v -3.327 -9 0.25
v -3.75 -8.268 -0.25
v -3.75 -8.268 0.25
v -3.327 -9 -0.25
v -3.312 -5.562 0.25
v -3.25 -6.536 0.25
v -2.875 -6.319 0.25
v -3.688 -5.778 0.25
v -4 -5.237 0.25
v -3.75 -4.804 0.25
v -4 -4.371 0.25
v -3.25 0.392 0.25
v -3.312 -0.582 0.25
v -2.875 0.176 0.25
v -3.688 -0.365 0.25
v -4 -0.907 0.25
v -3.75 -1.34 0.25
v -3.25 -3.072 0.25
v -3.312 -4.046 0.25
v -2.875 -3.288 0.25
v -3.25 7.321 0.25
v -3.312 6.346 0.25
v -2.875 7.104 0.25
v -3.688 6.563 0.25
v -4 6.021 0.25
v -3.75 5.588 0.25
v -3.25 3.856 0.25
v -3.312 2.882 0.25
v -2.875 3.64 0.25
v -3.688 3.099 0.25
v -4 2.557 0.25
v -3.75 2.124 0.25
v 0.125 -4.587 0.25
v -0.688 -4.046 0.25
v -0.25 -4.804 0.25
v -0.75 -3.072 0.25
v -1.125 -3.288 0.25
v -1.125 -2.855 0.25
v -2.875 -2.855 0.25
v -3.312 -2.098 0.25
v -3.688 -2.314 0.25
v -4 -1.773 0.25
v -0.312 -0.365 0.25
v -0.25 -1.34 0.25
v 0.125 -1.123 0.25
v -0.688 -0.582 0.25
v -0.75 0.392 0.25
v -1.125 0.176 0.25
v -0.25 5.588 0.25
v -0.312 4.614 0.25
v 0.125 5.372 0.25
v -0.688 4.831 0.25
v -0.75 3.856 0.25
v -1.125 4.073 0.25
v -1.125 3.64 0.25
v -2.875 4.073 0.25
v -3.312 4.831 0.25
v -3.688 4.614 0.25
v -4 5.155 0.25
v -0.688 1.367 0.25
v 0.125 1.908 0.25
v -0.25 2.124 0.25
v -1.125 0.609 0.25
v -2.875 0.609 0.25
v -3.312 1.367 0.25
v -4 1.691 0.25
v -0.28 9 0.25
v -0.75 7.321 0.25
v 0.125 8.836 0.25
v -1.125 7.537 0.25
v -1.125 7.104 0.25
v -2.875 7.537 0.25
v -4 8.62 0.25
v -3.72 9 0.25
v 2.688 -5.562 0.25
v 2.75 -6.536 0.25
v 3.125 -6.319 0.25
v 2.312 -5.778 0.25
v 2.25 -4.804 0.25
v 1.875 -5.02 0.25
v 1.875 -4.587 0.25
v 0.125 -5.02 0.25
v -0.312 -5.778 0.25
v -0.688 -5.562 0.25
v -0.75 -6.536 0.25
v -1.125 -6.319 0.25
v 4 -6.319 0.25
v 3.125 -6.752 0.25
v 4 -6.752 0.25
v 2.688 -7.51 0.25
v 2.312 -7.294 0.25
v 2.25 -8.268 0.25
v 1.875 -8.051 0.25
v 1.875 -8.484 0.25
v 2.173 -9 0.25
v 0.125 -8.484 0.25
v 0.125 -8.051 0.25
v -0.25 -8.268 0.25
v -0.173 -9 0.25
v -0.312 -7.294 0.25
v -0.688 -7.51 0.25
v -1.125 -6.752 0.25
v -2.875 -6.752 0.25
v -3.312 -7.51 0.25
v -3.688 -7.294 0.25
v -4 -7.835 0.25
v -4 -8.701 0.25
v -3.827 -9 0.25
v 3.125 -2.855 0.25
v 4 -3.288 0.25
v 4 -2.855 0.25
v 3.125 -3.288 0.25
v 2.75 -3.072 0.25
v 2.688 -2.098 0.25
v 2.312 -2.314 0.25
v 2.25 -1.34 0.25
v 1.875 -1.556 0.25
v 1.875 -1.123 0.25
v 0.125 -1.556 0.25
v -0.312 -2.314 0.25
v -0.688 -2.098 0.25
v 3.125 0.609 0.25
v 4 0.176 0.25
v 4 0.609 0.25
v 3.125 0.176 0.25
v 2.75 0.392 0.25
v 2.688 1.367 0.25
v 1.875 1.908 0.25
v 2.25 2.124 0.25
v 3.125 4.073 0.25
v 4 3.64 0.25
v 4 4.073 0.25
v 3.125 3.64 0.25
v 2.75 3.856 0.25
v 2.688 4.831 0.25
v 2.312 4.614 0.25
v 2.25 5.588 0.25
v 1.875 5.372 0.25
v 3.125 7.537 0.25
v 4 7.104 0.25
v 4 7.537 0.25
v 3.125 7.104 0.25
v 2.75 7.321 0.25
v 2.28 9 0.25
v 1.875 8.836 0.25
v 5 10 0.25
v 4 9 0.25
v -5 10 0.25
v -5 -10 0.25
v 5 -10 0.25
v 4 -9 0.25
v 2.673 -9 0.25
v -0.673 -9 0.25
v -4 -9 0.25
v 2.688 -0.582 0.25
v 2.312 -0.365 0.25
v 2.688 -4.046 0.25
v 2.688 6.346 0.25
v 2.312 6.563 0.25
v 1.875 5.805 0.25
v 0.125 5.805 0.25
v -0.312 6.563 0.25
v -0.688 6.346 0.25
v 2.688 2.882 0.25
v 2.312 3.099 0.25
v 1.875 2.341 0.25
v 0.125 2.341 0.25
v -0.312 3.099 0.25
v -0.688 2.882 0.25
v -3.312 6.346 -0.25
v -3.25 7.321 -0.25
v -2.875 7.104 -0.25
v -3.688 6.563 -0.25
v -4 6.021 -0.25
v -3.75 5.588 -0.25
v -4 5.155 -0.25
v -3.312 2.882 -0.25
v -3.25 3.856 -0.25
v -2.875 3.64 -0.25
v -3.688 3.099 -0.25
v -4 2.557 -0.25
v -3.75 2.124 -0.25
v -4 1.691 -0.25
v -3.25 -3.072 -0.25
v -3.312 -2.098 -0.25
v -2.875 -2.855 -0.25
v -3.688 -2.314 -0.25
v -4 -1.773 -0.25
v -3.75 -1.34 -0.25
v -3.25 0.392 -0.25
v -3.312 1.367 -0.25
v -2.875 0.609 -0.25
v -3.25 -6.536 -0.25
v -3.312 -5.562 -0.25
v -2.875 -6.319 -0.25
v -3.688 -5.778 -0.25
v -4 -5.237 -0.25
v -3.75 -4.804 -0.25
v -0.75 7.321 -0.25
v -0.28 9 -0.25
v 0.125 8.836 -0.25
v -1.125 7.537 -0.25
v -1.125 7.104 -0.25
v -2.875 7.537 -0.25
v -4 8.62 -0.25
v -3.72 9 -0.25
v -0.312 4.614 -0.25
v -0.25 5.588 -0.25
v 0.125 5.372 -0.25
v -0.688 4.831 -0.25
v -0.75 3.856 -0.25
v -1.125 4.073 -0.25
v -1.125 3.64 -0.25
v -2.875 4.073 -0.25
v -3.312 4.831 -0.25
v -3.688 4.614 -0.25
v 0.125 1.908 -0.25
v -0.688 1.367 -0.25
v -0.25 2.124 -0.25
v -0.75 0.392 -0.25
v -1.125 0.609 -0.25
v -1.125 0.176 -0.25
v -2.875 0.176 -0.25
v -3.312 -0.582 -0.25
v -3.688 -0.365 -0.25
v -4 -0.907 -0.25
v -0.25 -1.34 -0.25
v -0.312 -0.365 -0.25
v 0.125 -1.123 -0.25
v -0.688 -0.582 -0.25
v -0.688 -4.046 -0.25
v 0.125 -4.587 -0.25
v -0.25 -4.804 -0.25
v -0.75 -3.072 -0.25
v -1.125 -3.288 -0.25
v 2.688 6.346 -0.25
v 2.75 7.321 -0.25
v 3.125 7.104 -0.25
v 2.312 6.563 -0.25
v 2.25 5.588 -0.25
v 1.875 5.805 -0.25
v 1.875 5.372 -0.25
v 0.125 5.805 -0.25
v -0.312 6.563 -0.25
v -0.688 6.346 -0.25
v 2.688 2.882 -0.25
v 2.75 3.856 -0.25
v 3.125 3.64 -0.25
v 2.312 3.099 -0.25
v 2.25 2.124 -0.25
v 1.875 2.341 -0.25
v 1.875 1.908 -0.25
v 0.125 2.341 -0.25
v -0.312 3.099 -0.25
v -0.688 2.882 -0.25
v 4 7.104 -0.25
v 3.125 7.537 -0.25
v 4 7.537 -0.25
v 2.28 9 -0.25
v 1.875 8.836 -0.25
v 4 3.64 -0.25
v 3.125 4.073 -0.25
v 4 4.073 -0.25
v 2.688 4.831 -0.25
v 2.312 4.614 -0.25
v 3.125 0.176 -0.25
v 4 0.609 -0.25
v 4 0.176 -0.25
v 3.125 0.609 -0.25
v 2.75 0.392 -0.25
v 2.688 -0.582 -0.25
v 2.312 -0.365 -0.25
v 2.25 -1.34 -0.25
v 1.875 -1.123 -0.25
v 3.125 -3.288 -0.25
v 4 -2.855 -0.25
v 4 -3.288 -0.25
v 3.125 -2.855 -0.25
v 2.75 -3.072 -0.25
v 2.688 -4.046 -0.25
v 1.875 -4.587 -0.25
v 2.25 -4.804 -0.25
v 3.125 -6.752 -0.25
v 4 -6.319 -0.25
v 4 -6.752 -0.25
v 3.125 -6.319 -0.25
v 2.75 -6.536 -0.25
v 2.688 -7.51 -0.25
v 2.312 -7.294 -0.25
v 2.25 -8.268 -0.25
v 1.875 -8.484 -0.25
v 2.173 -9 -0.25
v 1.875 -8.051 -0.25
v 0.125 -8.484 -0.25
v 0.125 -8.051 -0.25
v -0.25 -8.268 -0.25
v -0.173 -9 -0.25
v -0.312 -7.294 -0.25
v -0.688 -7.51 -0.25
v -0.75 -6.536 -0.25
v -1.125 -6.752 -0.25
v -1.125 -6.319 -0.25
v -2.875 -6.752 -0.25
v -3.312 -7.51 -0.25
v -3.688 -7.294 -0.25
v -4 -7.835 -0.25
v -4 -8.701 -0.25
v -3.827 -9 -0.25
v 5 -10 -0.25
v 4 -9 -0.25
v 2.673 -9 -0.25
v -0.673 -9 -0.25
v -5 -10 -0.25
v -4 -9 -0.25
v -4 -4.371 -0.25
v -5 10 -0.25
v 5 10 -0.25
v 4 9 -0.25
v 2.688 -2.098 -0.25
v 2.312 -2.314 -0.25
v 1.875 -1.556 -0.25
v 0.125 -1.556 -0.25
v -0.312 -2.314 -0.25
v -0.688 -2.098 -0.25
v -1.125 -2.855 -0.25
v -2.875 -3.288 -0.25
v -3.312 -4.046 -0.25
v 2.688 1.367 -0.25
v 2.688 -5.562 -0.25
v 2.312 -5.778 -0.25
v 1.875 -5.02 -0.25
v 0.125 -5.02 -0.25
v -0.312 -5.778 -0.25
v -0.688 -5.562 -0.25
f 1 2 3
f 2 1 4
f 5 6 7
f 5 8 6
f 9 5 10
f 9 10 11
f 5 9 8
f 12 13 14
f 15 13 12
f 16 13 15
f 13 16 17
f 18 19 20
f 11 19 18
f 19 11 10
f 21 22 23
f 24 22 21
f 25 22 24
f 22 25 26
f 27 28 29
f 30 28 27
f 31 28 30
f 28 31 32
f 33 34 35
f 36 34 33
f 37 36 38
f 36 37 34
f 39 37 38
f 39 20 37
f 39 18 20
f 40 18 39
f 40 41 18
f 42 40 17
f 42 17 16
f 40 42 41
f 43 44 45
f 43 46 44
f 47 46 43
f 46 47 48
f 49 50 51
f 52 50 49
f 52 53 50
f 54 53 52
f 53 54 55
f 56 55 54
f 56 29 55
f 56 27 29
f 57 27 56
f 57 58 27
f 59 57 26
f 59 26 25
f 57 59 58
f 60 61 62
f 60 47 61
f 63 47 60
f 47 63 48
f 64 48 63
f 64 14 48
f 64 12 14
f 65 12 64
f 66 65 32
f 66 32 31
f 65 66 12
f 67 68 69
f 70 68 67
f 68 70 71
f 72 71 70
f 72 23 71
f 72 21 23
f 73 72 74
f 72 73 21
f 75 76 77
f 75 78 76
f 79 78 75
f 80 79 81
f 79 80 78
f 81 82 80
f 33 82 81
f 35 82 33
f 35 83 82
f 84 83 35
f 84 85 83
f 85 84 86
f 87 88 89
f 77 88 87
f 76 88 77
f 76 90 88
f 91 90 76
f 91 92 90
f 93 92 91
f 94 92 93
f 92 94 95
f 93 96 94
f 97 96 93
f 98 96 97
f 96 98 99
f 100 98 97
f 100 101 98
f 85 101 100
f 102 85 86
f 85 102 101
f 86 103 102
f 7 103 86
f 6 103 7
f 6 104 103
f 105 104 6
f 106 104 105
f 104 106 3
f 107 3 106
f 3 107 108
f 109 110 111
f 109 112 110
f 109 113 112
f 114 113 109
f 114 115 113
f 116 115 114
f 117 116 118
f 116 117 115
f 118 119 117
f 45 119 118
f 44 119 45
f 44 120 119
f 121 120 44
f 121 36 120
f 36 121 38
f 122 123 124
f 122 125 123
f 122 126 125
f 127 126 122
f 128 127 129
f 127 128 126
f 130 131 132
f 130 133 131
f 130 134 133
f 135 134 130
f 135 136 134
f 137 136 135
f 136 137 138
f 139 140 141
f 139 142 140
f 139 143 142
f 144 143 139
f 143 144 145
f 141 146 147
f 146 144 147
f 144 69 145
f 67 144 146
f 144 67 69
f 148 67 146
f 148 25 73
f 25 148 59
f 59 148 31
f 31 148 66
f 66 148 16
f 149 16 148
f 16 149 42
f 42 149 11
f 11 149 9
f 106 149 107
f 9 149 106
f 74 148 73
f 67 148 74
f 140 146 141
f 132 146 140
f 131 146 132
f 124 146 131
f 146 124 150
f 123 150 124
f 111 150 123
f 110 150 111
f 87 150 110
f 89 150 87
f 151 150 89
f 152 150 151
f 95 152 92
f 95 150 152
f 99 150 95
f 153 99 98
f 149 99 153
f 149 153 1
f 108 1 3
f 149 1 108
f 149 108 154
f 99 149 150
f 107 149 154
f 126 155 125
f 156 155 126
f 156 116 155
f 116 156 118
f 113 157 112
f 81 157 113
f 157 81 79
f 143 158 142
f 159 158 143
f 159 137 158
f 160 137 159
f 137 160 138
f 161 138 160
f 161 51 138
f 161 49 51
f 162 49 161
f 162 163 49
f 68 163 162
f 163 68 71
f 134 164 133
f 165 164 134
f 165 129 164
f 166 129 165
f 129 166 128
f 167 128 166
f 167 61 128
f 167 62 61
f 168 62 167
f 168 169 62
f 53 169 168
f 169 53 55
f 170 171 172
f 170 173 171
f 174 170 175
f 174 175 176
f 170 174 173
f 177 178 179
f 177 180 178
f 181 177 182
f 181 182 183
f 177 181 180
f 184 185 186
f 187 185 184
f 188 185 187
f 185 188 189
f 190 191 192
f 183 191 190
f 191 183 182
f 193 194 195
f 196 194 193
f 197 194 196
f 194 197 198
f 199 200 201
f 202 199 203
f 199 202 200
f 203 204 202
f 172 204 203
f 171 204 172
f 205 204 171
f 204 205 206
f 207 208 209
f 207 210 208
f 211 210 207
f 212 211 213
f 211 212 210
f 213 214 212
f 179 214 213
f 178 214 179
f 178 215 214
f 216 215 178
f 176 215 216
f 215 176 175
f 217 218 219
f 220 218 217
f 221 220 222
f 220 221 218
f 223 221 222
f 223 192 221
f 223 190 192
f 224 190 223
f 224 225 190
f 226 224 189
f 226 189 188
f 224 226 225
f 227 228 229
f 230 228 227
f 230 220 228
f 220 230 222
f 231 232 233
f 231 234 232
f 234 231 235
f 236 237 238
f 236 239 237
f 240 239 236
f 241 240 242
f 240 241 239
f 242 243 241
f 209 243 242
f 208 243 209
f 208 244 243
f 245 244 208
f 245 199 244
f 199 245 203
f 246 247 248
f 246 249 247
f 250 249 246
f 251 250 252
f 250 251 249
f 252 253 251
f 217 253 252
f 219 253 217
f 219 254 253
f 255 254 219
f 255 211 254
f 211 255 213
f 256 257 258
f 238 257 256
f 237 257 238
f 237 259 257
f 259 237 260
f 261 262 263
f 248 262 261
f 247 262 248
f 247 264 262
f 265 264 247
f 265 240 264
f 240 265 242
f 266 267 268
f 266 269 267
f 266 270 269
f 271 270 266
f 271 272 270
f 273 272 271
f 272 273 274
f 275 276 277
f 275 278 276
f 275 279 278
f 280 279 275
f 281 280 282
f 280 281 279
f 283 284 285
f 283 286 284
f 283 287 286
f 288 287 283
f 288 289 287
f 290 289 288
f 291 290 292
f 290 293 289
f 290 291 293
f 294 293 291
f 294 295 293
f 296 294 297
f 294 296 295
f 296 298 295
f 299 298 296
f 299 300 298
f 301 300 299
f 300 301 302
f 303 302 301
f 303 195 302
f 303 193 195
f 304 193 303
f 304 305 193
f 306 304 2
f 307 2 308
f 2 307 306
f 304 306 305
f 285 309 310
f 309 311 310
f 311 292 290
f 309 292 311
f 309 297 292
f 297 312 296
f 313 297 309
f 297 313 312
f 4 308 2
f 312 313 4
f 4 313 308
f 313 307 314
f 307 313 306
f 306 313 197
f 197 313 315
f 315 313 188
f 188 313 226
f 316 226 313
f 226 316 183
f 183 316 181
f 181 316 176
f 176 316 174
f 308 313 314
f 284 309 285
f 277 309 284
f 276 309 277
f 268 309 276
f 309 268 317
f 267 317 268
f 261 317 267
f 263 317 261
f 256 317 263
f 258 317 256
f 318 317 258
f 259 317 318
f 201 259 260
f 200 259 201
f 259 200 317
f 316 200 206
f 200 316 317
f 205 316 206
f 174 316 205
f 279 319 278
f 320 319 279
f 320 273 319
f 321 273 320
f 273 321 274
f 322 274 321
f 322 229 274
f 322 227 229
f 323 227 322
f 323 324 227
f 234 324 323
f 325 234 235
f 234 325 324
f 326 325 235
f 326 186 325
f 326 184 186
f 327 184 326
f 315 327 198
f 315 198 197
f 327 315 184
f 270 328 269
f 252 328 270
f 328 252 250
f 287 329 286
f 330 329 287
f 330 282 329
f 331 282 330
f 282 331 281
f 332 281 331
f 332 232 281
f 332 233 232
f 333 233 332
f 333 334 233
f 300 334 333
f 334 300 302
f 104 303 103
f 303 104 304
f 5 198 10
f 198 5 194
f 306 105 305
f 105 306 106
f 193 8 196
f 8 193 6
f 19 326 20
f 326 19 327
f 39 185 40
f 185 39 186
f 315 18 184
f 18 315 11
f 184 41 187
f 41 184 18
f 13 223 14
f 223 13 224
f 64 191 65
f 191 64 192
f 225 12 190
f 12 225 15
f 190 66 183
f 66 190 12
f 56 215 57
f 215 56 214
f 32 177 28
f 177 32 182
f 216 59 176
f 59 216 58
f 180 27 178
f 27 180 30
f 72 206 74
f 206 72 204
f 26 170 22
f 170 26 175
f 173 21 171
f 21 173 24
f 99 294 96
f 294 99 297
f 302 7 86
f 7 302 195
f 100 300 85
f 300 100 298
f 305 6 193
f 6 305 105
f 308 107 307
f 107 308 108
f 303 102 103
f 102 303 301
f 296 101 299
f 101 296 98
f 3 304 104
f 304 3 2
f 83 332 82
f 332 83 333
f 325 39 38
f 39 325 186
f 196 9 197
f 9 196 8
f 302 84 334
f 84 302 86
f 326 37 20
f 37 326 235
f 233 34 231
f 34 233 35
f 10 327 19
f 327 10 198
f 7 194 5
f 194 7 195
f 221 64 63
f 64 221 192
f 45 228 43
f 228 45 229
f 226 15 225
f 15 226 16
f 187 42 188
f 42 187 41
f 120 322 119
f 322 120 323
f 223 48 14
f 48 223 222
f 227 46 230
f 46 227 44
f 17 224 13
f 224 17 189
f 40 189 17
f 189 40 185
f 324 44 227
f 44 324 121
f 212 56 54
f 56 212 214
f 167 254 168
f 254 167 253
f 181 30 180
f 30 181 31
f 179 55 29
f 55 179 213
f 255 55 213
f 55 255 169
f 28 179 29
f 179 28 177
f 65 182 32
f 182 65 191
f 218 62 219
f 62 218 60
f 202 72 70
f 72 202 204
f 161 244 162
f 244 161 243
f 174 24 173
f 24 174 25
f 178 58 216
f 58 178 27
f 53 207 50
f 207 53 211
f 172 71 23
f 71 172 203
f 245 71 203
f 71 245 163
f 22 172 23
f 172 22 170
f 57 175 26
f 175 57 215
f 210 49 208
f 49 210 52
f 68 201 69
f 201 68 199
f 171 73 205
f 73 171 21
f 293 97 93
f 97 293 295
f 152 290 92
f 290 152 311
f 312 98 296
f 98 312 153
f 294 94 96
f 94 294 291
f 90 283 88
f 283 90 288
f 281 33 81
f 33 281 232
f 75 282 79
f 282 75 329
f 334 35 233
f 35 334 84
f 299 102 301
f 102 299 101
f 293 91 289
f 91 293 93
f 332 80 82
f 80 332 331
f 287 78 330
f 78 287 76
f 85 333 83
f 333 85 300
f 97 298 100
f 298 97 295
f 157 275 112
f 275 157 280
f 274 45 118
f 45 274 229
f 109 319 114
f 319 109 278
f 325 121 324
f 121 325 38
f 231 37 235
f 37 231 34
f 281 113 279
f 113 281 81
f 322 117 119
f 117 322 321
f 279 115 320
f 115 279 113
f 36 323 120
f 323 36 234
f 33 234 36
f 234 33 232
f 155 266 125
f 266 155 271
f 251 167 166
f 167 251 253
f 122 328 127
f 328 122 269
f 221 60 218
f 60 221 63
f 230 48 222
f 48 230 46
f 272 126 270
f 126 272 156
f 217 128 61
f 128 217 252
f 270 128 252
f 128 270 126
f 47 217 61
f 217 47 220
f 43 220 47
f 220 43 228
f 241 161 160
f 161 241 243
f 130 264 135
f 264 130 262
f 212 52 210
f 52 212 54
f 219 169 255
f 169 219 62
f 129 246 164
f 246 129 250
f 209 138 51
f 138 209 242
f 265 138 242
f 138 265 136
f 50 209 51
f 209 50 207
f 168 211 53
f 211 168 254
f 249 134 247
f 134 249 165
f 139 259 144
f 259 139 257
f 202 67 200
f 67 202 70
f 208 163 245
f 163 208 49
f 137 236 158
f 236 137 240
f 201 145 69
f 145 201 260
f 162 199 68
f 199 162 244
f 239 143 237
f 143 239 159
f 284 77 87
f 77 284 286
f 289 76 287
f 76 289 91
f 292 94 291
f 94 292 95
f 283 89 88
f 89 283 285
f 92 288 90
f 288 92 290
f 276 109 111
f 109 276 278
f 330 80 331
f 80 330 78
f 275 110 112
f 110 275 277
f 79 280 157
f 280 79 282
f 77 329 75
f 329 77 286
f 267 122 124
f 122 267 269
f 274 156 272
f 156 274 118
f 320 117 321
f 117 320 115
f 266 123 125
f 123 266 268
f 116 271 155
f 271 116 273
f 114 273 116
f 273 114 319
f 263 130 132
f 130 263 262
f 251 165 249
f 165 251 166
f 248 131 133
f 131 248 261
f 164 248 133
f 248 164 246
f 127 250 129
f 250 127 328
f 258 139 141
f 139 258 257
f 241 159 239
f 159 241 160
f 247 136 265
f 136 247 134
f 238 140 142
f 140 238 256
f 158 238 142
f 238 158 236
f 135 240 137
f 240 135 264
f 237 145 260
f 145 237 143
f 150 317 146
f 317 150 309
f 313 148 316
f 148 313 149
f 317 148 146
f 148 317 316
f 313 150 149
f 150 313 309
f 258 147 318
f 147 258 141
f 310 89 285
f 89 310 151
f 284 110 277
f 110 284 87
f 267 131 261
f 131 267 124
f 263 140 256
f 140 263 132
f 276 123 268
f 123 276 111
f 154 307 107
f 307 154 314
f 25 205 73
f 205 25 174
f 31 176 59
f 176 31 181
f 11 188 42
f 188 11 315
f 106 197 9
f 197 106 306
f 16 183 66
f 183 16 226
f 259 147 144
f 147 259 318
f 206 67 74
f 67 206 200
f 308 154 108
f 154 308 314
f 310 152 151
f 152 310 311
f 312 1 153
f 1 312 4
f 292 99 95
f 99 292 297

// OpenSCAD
// Craig Anderson
// prefix parameter variable names with hexgrid_dvogonen_
// Mon Aug 22 15:14:48 MDT 2016

// Customizable hex pattern
// Created by Kjell Kernen
// Date 22.9.2014

/*[Pattern Parameters]*/
// of the pattern in mm:
hexgrid_dvogonen_width=10;       // [10:100]

// of the pattern in mm:
hexgrid_dvogonen_length=20;      // [10:100]

// of the pattern in tens of mm:
hexgrid_dvogonen_height=5;       // [2:200]

// in tens of mm:
hexgrid_dvogonen_border_width=20;// [2:100]

// in mm:
hexgrid_dvogonen_hex_radius=2;   // [1:20]

// in tens of mm: 
hexgrid_dvogonen_hex_border_width=5; // [2:50]

/*[Hidden]*/

xborder=(hexgrid_dvogonen_border_width/10<hexgrid_dvogonen_width)?hexgrid_dvogonen_width-hexgrid_dvogonen_border_width/10:0;
yborder=(hexgrid_dvogonen_border_width/10<hexgrid_dvogonen_length)?hexgrid_dvogonen_length-hexgrid_dvogonen_border_width/10:0;

x=sqrt(3/4*hexgrid_dvogonen_hex_radius*hexgrid_dvogonen_hex_radius);
ystep=2*x;
xstep=3*hexgrid_dvogonen_hex_radius/2;

module hex(x,y)
{
	difference()
	{
		translate([x,y,-hexgrid_dvogonen_height/20]) 
			cylinder(r=(hexgrid_dvogonen_hex_radius+hexgrid_dvogonen_hex_border_width/20), h=hexgrid_dvogonen_height/10, $fn=6);	
		translate([x,y,-hexgrid_dvogonen_height/20]) 
			cylinder(r=(hexgrid_dvogonen_hex_radius-hexgrid_dvogonen_hex_border_width/20), h=hexgrid_dvogonen_height/10, $fn=6);
	}
}

//Pattern
intersection()
{
	for (xi=[0:xstep:hexgrid_dvogonen_width])
		for(yi=[0:ystep:hexgrid_dvogonen_length])
			hex(xi-hexgrid_dvogonen_width/2,((((xi/xstep)%2)==0)?0:ystep/2)+yi-hexgrid_dvogonen_length/2);
	translate([-hexgrid_dvogonen_width/2, -hexgrid_dvogonen_length/2, -hexgrid_dvogonen_height/20]) 
		cube([hexgrid_dvogonen_width,hexgrid_dvogonen_length,hexgrid_dvogonen_height/10]);
}

// Frame
difference()
{
	translate([-hexgrid_dvogonen_width/2, -hexgrid_dvogonen_length/2, -hexgrid_dvogonen_height/20]) 
		cube([hexgrid_dvogonen_width,hexgrid_dvogonen_length,hexgrid_dvogonen_height/10]);
	translate([-xborder/2, -yborder/2, -(hexgrid_dvogonen_height/20+0.1)]) 
		cube([xborder,yborder,hexgrid_dvogonen_height/10+0.2]); 
}
